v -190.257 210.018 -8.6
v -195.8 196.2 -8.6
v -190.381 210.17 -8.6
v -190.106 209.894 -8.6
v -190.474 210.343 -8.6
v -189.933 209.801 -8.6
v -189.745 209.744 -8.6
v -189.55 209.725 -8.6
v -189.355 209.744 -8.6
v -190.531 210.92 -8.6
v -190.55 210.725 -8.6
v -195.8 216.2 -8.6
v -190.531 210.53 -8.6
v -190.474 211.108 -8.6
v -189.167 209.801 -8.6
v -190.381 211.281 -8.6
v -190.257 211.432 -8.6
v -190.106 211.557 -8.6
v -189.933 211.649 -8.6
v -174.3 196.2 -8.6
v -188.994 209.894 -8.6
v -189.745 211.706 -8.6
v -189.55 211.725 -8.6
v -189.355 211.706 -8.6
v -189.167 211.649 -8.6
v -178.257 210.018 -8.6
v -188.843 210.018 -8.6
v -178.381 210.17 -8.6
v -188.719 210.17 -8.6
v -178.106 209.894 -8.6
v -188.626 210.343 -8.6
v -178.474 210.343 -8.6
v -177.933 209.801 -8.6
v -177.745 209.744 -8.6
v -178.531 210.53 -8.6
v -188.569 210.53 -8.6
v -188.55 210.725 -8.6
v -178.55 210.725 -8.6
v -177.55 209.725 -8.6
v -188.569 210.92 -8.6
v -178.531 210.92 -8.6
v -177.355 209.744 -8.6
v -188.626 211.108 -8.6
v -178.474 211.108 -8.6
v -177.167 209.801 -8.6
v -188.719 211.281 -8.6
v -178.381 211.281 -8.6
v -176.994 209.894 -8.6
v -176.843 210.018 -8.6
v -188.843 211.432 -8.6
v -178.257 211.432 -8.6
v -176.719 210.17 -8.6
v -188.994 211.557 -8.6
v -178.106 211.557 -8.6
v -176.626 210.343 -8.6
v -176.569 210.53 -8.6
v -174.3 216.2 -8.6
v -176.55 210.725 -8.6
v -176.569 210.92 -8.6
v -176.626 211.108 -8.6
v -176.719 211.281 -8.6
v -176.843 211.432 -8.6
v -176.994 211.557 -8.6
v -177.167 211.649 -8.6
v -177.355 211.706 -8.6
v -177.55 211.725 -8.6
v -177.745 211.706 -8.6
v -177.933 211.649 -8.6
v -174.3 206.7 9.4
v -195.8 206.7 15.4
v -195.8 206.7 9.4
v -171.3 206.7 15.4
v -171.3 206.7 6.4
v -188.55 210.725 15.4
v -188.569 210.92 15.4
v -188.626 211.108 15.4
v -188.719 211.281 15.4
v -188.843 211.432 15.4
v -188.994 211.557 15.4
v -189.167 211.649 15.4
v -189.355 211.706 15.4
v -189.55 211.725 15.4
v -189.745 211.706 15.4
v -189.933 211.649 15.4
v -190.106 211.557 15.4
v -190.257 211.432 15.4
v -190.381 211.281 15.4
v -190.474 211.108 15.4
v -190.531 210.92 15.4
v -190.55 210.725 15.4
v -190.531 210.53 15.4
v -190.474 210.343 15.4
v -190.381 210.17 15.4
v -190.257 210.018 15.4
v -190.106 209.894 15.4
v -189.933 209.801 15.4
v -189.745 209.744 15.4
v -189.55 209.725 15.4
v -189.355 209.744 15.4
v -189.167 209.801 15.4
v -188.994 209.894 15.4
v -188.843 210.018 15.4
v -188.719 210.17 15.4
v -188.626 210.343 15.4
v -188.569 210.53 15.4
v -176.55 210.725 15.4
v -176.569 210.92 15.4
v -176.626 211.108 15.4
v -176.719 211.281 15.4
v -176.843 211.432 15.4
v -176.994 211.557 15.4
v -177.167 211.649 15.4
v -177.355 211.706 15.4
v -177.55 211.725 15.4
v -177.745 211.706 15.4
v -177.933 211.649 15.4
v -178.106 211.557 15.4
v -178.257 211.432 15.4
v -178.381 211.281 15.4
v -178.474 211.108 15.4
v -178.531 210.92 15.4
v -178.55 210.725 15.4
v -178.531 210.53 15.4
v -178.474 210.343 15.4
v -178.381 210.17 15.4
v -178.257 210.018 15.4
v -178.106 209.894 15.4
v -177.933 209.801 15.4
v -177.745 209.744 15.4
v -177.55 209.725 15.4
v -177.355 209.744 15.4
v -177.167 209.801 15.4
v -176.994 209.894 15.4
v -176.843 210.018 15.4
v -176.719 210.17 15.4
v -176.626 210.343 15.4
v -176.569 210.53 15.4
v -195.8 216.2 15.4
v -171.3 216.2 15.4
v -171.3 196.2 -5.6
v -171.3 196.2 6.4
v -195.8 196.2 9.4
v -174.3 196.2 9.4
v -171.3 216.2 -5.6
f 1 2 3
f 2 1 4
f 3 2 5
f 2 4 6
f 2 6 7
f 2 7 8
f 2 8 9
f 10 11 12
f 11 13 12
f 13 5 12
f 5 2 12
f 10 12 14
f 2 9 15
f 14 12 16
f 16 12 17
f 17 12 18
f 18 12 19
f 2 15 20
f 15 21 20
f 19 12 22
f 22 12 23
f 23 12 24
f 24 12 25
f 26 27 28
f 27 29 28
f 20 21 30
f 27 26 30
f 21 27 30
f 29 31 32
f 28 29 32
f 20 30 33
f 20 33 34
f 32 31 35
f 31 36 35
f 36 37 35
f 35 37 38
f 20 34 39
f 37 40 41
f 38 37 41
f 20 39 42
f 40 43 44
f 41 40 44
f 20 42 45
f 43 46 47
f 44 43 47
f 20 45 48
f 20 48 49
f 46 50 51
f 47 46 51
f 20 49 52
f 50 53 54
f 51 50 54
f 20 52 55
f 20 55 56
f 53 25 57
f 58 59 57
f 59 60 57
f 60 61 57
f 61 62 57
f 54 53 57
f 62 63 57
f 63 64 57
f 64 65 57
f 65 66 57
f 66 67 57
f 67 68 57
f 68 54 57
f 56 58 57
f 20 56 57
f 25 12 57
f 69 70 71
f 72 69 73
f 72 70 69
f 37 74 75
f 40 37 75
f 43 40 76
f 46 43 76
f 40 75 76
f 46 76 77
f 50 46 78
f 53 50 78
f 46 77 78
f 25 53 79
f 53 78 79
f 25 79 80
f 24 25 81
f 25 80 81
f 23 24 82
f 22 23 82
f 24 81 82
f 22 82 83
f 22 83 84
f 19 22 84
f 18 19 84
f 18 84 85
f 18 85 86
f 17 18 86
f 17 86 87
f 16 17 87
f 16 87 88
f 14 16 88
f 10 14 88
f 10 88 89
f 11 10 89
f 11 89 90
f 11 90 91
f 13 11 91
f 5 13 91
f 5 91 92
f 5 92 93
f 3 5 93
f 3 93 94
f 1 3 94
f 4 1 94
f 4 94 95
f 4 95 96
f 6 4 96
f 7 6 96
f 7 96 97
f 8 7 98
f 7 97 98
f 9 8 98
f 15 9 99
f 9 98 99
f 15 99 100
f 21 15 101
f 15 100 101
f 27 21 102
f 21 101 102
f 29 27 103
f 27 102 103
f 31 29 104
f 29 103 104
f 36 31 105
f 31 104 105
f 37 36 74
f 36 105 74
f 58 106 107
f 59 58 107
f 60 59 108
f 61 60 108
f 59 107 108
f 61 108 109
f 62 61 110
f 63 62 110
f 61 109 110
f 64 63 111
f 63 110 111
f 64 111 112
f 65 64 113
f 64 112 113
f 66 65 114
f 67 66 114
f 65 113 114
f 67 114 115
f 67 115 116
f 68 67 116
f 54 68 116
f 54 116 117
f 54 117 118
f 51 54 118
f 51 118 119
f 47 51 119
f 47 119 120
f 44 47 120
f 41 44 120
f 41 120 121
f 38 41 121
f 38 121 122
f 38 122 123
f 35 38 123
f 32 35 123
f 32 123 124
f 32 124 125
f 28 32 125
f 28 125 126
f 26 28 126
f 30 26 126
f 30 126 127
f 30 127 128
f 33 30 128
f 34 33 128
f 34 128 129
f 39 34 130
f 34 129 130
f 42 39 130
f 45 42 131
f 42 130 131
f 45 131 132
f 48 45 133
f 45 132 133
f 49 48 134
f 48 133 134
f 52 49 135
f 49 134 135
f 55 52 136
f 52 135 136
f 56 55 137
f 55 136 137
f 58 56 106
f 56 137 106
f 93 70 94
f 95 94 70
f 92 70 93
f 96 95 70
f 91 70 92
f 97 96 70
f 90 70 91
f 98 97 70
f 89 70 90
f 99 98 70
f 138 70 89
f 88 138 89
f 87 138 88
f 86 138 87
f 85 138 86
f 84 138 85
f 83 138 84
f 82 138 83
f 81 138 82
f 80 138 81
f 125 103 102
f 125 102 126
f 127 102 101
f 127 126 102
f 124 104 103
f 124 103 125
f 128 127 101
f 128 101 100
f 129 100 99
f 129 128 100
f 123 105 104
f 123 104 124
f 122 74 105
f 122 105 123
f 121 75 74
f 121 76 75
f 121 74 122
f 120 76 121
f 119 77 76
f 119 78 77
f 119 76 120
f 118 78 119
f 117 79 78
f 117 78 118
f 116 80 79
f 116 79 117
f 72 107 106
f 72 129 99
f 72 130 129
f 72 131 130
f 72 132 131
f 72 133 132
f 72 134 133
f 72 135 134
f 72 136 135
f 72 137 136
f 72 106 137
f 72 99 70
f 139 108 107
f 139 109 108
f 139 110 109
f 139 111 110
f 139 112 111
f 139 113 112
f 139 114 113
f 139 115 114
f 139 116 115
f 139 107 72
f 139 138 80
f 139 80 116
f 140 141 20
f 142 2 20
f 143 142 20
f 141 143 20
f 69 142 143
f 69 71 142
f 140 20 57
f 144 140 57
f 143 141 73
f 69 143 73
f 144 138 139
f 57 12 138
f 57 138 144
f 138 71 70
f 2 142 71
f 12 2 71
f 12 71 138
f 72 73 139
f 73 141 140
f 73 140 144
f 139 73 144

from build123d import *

# Parameters (mm, degrees)
SKETCH061_W     = 24.5
SKETCH061_H     = 20
PAD029_DEPTH    = 24
SKETCH062_W     = 24.5
SKETCH062_H     = 10.5
POCKET039_DEPTH = 6
CHAMFER023_SIZE = 3
SKETCH063_R     = 1
POCKET040_DEPTH = 24.001
CHAMFER025_SIZE = 3


with BuildPart() as part:
    # Sketch061 → Pad029 (new body)
    with BuildSketch(Plane.XY):
        with Locations((-183.55, 206.2)):
            Rectangle(SKETCH061_W, SKETCH061_H)
    extrude(amount=PAD029_DEPTH)

    # Sketch062 (on Face6 of Pad029) → Pocket039 (cut)
    with BuildSketch(Plane.XY.offset(24)):
        with Locations((-183.55, 201.45)):
            Rectangle(SKETCH062_W, SKETCH062_H)
    extrude(amount=-POCKET039_DEPTH, mode=Mode.SUBTRACT)

    # Chamfer023
    chamfer023_edges = [part.edges().sort_by_distance(p)[0] for p in [
        (-171.3, 201.45, 18),
    ]]
    chamfer(chamfer023_edges, length=CHAMFER023_SIZE)

    # Sketch063 (on Face7 of Chamfer023) → Pocket040 (cut, through all)
    with BuildSketch(Plane.XY.offset(24)):
        with Locations((-189.55, 210.725281)):
            Circle(SKETCH063_R)
        with Locations((-177.55, 210.725281)):
            Circle(SKETCH063_R)
    extrude(amount=-POCKET040_DEPTH, mode=Mode.SUBTRACT)

    # Chamfer025
    chamfer025_edges = [part.edges().sort_by_distance(p)[0] for p in [
        (-171.3, 206.2, 0),
    ]]
    chamfer(chamfer025_edges, length=CHAMFER025_SIZE)


with BuildPart() as part_1:
    # Body022 placement: moved
    add(part.part.moved(Location((0, 0, -8.6))))


solid = part_1.part
